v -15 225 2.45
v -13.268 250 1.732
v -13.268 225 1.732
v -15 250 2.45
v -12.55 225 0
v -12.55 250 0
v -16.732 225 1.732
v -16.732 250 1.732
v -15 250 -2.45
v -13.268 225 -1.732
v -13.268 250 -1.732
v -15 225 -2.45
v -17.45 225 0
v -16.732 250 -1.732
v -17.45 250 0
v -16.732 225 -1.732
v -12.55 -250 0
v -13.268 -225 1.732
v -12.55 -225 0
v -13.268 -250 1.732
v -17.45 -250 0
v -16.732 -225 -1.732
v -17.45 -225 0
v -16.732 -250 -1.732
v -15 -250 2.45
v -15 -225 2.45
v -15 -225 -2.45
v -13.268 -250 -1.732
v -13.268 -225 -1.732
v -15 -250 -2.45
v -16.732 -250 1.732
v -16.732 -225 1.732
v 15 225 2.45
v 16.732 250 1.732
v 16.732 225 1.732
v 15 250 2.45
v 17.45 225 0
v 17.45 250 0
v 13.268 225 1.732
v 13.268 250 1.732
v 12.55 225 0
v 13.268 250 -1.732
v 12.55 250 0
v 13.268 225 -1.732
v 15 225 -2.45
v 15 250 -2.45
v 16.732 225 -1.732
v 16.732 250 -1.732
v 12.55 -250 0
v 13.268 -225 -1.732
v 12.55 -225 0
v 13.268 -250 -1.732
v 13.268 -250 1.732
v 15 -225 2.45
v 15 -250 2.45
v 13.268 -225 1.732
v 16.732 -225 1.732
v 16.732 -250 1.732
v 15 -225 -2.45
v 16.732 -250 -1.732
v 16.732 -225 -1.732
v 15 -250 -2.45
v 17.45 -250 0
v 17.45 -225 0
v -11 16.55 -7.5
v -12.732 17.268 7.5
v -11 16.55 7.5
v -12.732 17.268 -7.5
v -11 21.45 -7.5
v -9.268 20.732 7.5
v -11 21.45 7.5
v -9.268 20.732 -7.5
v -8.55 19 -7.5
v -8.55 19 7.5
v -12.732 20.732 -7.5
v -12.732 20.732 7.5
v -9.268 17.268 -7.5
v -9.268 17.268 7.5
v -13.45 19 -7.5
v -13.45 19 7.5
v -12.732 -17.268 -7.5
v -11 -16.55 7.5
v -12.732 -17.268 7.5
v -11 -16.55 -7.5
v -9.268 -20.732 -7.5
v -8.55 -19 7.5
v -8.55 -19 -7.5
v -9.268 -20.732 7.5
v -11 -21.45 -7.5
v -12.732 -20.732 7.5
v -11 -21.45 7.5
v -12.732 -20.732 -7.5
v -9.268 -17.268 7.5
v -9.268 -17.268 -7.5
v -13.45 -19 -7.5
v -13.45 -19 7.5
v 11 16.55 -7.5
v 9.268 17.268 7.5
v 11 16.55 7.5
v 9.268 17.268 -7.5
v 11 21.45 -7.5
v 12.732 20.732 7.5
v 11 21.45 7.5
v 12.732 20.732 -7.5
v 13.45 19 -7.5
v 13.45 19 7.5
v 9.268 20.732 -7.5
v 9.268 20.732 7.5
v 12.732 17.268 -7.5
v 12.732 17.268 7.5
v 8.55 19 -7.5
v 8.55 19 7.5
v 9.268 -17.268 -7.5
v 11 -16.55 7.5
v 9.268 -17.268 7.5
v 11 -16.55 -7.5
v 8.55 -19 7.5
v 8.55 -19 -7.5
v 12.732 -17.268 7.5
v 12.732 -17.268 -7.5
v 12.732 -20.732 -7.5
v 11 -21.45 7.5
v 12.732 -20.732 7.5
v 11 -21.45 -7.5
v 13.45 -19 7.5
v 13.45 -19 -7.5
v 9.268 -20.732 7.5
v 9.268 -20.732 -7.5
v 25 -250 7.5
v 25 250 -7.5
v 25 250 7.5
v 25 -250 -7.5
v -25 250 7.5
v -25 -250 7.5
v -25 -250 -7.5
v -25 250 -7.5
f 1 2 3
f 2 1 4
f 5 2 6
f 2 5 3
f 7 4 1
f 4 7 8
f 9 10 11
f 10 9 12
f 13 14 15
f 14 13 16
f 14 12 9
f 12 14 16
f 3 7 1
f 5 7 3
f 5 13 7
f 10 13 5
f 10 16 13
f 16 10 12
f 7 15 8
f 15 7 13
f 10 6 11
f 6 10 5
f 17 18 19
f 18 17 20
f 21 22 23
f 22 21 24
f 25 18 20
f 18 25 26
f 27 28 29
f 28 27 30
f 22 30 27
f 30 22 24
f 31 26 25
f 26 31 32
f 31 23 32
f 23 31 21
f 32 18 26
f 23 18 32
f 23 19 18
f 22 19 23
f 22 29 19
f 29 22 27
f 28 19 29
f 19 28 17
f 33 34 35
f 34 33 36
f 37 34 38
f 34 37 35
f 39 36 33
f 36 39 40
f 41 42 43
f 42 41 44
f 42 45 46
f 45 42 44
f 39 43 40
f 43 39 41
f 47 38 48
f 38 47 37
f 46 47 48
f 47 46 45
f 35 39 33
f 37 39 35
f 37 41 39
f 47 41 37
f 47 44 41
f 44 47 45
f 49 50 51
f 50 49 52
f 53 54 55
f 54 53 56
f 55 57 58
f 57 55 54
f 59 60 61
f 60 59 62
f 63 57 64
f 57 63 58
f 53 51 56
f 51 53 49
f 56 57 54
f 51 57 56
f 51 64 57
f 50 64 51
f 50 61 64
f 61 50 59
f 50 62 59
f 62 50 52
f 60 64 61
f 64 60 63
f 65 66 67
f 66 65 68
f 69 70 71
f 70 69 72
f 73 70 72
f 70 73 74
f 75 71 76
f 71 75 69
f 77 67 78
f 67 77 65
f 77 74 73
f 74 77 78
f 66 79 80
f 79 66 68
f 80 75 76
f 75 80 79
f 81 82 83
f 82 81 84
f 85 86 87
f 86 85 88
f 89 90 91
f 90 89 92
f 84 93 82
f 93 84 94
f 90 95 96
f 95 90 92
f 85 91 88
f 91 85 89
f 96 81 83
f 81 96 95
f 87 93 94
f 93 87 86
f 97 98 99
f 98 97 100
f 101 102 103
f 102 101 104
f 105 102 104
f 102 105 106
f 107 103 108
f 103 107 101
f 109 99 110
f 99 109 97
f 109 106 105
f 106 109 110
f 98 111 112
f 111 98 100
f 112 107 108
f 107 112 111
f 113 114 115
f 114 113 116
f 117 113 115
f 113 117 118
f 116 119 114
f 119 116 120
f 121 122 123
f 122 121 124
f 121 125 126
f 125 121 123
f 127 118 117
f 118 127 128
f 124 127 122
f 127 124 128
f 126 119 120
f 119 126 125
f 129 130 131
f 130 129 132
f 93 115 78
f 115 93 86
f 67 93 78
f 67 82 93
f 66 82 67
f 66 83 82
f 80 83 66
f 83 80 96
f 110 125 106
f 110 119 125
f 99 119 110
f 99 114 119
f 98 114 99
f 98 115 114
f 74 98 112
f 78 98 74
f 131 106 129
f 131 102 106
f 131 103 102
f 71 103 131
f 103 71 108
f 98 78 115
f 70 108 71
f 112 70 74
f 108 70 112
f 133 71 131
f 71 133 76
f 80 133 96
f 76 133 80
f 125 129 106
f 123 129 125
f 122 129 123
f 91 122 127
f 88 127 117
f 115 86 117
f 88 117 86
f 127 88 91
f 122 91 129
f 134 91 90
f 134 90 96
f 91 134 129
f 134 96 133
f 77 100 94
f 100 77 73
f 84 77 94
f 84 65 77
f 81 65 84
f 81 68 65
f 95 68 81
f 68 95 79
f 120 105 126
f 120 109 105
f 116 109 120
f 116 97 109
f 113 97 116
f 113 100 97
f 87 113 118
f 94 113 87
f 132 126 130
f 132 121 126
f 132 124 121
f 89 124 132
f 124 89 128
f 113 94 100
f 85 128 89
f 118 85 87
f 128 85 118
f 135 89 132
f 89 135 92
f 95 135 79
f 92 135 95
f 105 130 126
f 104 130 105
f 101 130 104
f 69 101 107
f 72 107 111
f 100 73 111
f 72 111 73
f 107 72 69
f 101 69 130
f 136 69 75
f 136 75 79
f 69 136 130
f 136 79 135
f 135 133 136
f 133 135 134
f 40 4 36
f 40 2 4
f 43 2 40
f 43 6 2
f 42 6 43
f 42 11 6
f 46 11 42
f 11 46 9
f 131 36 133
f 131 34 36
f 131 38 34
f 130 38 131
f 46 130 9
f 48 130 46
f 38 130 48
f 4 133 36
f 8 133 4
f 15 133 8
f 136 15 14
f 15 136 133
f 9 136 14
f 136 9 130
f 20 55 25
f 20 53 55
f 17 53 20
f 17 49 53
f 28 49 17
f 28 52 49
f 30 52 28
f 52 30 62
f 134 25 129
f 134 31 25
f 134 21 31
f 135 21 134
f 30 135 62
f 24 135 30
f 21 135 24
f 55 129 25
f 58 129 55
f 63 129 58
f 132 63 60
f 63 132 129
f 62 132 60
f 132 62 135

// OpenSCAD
// file: Library.scad
/*
 * Generic modules for manipulating objects
 */

module mirror_copy(vec=[0,1,0]) { 
    children(); 
    mirror(vec) children(); 
}

module move(x=0, y=0, z=0) {
    translate([x, y, z]) children();
}
// main file
use <Library.scad>;

module gantryBottomPlate(length=100, width=50, thickness=15) {
	
	m5 = 4.9;
	holedistance = 30;
	
	difference() {
		cube([width, length, thickness], center=true);
		
		//M5 screwholes at the ends
		for (x = [-1,1]) 
			mirror_copy() translate([x*holedistance/2,length/2, 0]) rotate([90,0,0]) cylinder(d=m5, h=50, center=true);
		
		//M5(?) screwholes at the center
		for (x=[-1,1])
            mirror_copy() translate([x*(35/2-6.5),48/2-5,-thickness]) cylinder(h=thickness*2, center=false, d=m5);
	}
}

gantryBottomPlate(500);
